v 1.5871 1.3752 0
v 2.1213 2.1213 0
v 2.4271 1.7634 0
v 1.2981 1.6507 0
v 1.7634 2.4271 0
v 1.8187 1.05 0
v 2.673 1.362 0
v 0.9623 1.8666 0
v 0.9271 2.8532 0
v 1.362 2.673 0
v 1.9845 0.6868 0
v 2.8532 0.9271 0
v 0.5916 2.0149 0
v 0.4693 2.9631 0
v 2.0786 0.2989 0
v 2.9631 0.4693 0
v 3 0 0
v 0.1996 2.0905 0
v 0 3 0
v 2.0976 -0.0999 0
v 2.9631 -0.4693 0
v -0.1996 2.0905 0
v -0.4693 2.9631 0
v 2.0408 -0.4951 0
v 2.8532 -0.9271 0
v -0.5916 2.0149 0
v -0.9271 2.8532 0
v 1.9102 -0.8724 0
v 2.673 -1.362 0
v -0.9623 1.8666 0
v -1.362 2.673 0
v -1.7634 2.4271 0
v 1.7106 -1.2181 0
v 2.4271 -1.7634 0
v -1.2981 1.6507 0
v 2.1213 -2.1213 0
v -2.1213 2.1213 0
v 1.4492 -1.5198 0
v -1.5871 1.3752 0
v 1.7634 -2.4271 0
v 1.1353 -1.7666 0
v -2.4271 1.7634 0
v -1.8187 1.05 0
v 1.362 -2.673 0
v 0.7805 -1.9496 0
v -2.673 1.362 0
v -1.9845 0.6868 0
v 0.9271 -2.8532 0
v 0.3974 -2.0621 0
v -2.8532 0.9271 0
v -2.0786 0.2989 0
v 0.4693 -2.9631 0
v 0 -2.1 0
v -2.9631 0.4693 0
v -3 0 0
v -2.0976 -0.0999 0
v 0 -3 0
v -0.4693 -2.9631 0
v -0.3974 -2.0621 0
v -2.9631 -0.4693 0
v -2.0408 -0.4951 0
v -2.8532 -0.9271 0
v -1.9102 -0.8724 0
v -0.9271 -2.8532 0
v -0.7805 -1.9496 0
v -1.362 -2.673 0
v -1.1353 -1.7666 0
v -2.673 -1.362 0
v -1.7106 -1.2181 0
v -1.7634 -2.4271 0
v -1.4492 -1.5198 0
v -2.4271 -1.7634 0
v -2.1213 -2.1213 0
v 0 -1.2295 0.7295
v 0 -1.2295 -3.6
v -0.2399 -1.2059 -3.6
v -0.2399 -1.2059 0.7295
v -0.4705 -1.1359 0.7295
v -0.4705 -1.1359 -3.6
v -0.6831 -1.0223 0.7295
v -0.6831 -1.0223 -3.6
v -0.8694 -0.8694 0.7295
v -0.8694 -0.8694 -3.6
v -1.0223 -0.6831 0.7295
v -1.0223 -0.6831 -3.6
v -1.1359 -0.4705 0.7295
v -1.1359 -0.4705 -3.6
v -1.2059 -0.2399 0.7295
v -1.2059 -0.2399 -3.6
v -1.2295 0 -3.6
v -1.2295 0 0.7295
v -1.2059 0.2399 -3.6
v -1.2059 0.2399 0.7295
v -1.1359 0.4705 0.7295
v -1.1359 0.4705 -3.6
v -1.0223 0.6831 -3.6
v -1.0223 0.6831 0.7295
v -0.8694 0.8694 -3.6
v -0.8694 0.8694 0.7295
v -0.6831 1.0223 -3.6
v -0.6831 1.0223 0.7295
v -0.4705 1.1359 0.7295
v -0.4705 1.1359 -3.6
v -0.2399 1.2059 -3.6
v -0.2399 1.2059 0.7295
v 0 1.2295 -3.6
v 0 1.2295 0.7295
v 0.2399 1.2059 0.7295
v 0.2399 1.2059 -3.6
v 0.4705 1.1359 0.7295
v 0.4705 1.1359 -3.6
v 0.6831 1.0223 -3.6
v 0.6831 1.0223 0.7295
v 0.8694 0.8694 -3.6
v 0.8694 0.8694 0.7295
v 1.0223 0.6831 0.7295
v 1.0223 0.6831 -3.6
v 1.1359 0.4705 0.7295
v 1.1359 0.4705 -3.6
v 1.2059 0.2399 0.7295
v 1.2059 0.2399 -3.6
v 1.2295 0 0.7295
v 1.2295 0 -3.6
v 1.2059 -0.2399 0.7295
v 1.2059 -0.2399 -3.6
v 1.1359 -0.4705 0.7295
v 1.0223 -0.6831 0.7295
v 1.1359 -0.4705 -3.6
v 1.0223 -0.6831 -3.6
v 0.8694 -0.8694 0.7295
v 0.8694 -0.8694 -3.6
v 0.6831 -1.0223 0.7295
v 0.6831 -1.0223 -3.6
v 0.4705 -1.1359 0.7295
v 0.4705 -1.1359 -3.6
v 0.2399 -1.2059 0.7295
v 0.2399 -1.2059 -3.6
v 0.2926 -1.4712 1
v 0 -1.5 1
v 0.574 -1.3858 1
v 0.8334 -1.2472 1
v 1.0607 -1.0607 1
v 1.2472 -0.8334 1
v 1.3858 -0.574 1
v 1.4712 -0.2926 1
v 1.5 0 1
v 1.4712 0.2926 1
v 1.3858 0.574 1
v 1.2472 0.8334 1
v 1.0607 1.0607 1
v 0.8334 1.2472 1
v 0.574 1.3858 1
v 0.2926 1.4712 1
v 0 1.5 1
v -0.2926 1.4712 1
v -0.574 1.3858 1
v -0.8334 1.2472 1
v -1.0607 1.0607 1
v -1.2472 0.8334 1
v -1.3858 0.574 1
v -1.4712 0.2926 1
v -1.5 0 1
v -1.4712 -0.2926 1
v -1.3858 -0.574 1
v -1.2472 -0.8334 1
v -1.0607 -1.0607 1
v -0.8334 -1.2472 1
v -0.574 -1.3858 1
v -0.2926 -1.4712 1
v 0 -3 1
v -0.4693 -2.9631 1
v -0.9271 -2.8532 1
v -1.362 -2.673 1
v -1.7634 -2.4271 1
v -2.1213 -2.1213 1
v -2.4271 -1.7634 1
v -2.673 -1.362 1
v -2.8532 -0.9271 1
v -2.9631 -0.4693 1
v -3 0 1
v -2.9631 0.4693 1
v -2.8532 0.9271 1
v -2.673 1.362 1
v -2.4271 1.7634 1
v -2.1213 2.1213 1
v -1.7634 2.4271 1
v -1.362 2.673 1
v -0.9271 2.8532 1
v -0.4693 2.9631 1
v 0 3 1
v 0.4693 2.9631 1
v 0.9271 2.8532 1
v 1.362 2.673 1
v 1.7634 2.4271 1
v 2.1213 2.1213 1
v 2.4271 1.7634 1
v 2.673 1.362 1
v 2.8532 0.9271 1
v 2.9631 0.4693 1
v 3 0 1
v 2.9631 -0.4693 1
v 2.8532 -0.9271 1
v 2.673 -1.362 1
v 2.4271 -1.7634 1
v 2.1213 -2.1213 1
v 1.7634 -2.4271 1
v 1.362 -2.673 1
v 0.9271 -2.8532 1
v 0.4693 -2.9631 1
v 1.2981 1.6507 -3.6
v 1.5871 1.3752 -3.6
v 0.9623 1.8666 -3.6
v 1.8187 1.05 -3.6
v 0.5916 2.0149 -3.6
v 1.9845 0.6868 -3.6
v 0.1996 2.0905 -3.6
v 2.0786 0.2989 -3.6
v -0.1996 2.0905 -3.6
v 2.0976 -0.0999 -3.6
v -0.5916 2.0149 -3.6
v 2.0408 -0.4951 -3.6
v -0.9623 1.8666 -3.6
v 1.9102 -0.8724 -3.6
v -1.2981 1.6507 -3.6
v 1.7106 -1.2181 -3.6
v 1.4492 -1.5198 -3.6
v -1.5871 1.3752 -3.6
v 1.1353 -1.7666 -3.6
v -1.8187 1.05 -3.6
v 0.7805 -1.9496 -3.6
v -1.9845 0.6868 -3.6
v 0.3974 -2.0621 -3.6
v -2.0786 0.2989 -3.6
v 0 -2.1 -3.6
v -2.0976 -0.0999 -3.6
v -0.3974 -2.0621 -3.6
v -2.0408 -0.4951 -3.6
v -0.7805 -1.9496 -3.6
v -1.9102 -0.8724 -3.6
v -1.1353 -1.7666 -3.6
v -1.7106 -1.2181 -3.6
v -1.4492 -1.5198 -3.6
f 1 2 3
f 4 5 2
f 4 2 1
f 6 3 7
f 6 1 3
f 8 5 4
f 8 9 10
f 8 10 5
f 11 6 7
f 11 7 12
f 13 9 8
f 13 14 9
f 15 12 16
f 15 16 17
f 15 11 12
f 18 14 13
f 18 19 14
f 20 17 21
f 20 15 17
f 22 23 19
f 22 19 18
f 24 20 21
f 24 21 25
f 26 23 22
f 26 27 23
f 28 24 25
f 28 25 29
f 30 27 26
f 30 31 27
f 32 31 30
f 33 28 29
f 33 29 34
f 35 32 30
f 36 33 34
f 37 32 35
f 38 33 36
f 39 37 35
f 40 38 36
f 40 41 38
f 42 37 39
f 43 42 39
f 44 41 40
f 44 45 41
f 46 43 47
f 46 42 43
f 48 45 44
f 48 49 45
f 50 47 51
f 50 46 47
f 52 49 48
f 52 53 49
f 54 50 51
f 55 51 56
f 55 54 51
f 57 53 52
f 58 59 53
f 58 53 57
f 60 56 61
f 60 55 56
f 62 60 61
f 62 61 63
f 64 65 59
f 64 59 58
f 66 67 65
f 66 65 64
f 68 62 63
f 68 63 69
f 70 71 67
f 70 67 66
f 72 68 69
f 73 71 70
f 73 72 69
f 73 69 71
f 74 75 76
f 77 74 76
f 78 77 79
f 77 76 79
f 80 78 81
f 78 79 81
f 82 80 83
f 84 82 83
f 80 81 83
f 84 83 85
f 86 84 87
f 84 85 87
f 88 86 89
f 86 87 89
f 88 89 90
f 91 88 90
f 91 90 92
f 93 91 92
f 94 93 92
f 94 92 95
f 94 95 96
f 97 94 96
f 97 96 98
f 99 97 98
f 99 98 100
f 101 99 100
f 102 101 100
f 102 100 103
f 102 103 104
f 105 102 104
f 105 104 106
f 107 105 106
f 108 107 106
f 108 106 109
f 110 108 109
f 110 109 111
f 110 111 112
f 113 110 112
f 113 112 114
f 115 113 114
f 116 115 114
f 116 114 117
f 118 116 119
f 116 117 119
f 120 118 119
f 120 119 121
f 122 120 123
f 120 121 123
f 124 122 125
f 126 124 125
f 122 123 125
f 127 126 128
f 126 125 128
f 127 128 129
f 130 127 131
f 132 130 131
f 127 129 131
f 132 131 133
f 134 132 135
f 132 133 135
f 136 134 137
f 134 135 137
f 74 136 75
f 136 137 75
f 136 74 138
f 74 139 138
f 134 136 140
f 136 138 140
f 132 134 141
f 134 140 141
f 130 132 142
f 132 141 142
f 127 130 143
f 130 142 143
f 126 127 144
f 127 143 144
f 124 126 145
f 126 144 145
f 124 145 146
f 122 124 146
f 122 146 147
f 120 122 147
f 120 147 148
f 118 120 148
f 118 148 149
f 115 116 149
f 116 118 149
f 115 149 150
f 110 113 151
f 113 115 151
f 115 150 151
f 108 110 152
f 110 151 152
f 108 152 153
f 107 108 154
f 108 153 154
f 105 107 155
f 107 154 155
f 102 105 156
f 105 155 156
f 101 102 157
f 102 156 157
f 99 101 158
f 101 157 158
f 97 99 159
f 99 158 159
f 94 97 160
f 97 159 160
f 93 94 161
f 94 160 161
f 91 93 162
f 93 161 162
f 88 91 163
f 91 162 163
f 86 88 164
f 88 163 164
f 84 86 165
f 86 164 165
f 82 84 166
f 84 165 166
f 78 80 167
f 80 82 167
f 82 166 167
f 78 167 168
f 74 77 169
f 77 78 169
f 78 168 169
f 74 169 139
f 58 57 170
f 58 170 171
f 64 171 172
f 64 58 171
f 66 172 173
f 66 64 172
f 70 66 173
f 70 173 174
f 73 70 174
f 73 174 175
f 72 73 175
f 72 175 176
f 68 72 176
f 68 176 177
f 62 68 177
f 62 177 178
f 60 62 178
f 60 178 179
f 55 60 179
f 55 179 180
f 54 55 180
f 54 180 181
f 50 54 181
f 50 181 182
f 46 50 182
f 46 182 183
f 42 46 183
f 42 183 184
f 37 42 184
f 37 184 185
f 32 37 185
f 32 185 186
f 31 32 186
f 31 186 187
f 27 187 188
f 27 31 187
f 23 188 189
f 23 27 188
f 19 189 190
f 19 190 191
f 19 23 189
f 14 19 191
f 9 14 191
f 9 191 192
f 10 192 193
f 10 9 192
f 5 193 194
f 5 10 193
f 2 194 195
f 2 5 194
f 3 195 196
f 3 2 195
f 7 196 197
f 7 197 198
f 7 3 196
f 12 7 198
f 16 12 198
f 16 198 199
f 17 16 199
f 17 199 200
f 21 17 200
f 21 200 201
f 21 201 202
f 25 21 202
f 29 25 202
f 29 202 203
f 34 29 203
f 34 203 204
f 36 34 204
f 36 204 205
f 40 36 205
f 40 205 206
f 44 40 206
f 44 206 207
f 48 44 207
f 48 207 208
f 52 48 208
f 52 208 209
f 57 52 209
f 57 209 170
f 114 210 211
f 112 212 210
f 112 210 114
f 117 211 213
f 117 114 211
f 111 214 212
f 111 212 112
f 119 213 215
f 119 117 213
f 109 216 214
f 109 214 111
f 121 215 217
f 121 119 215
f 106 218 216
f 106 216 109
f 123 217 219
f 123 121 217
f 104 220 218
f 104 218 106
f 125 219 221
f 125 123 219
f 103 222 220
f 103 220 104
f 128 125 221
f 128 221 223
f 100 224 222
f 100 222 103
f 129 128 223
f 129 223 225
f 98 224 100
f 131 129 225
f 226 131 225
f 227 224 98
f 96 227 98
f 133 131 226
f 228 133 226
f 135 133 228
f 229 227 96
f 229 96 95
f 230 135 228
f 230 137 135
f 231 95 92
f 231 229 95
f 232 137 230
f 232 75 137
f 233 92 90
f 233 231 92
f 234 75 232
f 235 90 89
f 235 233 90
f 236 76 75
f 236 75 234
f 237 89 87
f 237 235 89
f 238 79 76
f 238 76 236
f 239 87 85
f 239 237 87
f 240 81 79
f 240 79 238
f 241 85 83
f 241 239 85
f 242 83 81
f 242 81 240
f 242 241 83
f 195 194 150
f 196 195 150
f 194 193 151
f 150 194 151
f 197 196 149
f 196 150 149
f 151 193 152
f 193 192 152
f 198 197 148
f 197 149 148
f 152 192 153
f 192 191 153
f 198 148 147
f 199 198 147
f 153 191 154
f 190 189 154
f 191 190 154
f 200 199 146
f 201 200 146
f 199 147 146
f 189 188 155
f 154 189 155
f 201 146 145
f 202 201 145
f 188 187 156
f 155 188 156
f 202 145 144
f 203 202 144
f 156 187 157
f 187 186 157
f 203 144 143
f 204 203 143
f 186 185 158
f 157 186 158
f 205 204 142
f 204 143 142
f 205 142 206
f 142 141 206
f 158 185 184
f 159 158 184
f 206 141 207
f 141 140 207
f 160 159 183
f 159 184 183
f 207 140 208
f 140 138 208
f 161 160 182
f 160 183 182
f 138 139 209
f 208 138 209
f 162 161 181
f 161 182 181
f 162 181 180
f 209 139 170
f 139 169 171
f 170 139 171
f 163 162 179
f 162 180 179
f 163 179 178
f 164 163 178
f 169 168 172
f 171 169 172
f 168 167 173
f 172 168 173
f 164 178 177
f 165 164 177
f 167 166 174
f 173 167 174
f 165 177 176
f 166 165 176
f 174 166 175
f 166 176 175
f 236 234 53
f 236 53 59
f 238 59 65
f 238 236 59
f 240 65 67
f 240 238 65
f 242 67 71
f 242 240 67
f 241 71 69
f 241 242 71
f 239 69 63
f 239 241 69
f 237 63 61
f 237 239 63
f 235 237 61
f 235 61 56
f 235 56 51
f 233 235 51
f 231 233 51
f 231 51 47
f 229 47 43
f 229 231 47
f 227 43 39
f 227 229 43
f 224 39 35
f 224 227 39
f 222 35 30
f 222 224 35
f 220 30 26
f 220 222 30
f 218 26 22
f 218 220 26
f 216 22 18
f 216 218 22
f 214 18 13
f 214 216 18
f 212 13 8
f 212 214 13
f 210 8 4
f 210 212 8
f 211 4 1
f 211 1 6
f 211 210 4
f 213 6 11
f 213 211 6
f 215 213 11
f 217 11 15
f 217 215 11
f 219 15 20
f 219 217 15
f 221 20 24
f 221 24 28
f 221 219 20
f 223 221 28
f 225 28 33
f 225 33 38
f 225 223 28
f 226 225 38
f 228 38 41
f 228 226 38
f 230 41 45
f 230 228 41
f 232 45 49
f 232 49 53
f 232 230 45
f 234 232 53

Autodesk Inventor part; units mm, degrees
ref_plane "YZ Plane" through (0, 0, 0) normal (1, 0, 0) x (0, 1, 0)
ref_plane "XZ Plane" through (0, 0, 0) normal (0, 1, 0) x (-1, 0, 0)
ref_plane "XY Plane" through (0, 0, 0) normal (0, 0, 1) x (1, 0, 0)
sketch "Skizze1" plane through (0, 0, 0) normal (1, 0, 0) x (0, 1, 0)
  line L0 (0, 1) -> (0, -3.6)
  line L1 (0, 1) -> (-3, 1)
  line L2 (-3, 1) -> (-3, 0)
  line L3 (-3, 0) -> (-2.1, 0)
  line L4 (-2.1, 0) -> (-2.1, -3.6)
  line L5 (-2.1, -3.6) -> (0, -3.6)
  point P0 (0, 0)
  dimension "d0" = 6
  dimension "d1" = 4.2
  dimension "d2" = 1
  dimension "Länge" = 3.6
revolve "Umdrehung1" add sketch "Skizze1" angle 360 about axis through (0, 0, 1) along (0, 0, -1)
sketch "Skizze2" plane through (0, 0, 1) normal (0, 0, 1) x (1, 0, 0)
  point P0 (0, 0)
  point P1 (0, 0)
hole "Bohrung1" at (0, 0, 1) direction (0, 0, -1) diameter 2.459 end through all countersink diameter 3 countersink angle 90 thread size "M3x0.5" class "6H" standard "ISO Metric profile"
properties part number "9775036360R" material "Stahl, geschmiedet"
